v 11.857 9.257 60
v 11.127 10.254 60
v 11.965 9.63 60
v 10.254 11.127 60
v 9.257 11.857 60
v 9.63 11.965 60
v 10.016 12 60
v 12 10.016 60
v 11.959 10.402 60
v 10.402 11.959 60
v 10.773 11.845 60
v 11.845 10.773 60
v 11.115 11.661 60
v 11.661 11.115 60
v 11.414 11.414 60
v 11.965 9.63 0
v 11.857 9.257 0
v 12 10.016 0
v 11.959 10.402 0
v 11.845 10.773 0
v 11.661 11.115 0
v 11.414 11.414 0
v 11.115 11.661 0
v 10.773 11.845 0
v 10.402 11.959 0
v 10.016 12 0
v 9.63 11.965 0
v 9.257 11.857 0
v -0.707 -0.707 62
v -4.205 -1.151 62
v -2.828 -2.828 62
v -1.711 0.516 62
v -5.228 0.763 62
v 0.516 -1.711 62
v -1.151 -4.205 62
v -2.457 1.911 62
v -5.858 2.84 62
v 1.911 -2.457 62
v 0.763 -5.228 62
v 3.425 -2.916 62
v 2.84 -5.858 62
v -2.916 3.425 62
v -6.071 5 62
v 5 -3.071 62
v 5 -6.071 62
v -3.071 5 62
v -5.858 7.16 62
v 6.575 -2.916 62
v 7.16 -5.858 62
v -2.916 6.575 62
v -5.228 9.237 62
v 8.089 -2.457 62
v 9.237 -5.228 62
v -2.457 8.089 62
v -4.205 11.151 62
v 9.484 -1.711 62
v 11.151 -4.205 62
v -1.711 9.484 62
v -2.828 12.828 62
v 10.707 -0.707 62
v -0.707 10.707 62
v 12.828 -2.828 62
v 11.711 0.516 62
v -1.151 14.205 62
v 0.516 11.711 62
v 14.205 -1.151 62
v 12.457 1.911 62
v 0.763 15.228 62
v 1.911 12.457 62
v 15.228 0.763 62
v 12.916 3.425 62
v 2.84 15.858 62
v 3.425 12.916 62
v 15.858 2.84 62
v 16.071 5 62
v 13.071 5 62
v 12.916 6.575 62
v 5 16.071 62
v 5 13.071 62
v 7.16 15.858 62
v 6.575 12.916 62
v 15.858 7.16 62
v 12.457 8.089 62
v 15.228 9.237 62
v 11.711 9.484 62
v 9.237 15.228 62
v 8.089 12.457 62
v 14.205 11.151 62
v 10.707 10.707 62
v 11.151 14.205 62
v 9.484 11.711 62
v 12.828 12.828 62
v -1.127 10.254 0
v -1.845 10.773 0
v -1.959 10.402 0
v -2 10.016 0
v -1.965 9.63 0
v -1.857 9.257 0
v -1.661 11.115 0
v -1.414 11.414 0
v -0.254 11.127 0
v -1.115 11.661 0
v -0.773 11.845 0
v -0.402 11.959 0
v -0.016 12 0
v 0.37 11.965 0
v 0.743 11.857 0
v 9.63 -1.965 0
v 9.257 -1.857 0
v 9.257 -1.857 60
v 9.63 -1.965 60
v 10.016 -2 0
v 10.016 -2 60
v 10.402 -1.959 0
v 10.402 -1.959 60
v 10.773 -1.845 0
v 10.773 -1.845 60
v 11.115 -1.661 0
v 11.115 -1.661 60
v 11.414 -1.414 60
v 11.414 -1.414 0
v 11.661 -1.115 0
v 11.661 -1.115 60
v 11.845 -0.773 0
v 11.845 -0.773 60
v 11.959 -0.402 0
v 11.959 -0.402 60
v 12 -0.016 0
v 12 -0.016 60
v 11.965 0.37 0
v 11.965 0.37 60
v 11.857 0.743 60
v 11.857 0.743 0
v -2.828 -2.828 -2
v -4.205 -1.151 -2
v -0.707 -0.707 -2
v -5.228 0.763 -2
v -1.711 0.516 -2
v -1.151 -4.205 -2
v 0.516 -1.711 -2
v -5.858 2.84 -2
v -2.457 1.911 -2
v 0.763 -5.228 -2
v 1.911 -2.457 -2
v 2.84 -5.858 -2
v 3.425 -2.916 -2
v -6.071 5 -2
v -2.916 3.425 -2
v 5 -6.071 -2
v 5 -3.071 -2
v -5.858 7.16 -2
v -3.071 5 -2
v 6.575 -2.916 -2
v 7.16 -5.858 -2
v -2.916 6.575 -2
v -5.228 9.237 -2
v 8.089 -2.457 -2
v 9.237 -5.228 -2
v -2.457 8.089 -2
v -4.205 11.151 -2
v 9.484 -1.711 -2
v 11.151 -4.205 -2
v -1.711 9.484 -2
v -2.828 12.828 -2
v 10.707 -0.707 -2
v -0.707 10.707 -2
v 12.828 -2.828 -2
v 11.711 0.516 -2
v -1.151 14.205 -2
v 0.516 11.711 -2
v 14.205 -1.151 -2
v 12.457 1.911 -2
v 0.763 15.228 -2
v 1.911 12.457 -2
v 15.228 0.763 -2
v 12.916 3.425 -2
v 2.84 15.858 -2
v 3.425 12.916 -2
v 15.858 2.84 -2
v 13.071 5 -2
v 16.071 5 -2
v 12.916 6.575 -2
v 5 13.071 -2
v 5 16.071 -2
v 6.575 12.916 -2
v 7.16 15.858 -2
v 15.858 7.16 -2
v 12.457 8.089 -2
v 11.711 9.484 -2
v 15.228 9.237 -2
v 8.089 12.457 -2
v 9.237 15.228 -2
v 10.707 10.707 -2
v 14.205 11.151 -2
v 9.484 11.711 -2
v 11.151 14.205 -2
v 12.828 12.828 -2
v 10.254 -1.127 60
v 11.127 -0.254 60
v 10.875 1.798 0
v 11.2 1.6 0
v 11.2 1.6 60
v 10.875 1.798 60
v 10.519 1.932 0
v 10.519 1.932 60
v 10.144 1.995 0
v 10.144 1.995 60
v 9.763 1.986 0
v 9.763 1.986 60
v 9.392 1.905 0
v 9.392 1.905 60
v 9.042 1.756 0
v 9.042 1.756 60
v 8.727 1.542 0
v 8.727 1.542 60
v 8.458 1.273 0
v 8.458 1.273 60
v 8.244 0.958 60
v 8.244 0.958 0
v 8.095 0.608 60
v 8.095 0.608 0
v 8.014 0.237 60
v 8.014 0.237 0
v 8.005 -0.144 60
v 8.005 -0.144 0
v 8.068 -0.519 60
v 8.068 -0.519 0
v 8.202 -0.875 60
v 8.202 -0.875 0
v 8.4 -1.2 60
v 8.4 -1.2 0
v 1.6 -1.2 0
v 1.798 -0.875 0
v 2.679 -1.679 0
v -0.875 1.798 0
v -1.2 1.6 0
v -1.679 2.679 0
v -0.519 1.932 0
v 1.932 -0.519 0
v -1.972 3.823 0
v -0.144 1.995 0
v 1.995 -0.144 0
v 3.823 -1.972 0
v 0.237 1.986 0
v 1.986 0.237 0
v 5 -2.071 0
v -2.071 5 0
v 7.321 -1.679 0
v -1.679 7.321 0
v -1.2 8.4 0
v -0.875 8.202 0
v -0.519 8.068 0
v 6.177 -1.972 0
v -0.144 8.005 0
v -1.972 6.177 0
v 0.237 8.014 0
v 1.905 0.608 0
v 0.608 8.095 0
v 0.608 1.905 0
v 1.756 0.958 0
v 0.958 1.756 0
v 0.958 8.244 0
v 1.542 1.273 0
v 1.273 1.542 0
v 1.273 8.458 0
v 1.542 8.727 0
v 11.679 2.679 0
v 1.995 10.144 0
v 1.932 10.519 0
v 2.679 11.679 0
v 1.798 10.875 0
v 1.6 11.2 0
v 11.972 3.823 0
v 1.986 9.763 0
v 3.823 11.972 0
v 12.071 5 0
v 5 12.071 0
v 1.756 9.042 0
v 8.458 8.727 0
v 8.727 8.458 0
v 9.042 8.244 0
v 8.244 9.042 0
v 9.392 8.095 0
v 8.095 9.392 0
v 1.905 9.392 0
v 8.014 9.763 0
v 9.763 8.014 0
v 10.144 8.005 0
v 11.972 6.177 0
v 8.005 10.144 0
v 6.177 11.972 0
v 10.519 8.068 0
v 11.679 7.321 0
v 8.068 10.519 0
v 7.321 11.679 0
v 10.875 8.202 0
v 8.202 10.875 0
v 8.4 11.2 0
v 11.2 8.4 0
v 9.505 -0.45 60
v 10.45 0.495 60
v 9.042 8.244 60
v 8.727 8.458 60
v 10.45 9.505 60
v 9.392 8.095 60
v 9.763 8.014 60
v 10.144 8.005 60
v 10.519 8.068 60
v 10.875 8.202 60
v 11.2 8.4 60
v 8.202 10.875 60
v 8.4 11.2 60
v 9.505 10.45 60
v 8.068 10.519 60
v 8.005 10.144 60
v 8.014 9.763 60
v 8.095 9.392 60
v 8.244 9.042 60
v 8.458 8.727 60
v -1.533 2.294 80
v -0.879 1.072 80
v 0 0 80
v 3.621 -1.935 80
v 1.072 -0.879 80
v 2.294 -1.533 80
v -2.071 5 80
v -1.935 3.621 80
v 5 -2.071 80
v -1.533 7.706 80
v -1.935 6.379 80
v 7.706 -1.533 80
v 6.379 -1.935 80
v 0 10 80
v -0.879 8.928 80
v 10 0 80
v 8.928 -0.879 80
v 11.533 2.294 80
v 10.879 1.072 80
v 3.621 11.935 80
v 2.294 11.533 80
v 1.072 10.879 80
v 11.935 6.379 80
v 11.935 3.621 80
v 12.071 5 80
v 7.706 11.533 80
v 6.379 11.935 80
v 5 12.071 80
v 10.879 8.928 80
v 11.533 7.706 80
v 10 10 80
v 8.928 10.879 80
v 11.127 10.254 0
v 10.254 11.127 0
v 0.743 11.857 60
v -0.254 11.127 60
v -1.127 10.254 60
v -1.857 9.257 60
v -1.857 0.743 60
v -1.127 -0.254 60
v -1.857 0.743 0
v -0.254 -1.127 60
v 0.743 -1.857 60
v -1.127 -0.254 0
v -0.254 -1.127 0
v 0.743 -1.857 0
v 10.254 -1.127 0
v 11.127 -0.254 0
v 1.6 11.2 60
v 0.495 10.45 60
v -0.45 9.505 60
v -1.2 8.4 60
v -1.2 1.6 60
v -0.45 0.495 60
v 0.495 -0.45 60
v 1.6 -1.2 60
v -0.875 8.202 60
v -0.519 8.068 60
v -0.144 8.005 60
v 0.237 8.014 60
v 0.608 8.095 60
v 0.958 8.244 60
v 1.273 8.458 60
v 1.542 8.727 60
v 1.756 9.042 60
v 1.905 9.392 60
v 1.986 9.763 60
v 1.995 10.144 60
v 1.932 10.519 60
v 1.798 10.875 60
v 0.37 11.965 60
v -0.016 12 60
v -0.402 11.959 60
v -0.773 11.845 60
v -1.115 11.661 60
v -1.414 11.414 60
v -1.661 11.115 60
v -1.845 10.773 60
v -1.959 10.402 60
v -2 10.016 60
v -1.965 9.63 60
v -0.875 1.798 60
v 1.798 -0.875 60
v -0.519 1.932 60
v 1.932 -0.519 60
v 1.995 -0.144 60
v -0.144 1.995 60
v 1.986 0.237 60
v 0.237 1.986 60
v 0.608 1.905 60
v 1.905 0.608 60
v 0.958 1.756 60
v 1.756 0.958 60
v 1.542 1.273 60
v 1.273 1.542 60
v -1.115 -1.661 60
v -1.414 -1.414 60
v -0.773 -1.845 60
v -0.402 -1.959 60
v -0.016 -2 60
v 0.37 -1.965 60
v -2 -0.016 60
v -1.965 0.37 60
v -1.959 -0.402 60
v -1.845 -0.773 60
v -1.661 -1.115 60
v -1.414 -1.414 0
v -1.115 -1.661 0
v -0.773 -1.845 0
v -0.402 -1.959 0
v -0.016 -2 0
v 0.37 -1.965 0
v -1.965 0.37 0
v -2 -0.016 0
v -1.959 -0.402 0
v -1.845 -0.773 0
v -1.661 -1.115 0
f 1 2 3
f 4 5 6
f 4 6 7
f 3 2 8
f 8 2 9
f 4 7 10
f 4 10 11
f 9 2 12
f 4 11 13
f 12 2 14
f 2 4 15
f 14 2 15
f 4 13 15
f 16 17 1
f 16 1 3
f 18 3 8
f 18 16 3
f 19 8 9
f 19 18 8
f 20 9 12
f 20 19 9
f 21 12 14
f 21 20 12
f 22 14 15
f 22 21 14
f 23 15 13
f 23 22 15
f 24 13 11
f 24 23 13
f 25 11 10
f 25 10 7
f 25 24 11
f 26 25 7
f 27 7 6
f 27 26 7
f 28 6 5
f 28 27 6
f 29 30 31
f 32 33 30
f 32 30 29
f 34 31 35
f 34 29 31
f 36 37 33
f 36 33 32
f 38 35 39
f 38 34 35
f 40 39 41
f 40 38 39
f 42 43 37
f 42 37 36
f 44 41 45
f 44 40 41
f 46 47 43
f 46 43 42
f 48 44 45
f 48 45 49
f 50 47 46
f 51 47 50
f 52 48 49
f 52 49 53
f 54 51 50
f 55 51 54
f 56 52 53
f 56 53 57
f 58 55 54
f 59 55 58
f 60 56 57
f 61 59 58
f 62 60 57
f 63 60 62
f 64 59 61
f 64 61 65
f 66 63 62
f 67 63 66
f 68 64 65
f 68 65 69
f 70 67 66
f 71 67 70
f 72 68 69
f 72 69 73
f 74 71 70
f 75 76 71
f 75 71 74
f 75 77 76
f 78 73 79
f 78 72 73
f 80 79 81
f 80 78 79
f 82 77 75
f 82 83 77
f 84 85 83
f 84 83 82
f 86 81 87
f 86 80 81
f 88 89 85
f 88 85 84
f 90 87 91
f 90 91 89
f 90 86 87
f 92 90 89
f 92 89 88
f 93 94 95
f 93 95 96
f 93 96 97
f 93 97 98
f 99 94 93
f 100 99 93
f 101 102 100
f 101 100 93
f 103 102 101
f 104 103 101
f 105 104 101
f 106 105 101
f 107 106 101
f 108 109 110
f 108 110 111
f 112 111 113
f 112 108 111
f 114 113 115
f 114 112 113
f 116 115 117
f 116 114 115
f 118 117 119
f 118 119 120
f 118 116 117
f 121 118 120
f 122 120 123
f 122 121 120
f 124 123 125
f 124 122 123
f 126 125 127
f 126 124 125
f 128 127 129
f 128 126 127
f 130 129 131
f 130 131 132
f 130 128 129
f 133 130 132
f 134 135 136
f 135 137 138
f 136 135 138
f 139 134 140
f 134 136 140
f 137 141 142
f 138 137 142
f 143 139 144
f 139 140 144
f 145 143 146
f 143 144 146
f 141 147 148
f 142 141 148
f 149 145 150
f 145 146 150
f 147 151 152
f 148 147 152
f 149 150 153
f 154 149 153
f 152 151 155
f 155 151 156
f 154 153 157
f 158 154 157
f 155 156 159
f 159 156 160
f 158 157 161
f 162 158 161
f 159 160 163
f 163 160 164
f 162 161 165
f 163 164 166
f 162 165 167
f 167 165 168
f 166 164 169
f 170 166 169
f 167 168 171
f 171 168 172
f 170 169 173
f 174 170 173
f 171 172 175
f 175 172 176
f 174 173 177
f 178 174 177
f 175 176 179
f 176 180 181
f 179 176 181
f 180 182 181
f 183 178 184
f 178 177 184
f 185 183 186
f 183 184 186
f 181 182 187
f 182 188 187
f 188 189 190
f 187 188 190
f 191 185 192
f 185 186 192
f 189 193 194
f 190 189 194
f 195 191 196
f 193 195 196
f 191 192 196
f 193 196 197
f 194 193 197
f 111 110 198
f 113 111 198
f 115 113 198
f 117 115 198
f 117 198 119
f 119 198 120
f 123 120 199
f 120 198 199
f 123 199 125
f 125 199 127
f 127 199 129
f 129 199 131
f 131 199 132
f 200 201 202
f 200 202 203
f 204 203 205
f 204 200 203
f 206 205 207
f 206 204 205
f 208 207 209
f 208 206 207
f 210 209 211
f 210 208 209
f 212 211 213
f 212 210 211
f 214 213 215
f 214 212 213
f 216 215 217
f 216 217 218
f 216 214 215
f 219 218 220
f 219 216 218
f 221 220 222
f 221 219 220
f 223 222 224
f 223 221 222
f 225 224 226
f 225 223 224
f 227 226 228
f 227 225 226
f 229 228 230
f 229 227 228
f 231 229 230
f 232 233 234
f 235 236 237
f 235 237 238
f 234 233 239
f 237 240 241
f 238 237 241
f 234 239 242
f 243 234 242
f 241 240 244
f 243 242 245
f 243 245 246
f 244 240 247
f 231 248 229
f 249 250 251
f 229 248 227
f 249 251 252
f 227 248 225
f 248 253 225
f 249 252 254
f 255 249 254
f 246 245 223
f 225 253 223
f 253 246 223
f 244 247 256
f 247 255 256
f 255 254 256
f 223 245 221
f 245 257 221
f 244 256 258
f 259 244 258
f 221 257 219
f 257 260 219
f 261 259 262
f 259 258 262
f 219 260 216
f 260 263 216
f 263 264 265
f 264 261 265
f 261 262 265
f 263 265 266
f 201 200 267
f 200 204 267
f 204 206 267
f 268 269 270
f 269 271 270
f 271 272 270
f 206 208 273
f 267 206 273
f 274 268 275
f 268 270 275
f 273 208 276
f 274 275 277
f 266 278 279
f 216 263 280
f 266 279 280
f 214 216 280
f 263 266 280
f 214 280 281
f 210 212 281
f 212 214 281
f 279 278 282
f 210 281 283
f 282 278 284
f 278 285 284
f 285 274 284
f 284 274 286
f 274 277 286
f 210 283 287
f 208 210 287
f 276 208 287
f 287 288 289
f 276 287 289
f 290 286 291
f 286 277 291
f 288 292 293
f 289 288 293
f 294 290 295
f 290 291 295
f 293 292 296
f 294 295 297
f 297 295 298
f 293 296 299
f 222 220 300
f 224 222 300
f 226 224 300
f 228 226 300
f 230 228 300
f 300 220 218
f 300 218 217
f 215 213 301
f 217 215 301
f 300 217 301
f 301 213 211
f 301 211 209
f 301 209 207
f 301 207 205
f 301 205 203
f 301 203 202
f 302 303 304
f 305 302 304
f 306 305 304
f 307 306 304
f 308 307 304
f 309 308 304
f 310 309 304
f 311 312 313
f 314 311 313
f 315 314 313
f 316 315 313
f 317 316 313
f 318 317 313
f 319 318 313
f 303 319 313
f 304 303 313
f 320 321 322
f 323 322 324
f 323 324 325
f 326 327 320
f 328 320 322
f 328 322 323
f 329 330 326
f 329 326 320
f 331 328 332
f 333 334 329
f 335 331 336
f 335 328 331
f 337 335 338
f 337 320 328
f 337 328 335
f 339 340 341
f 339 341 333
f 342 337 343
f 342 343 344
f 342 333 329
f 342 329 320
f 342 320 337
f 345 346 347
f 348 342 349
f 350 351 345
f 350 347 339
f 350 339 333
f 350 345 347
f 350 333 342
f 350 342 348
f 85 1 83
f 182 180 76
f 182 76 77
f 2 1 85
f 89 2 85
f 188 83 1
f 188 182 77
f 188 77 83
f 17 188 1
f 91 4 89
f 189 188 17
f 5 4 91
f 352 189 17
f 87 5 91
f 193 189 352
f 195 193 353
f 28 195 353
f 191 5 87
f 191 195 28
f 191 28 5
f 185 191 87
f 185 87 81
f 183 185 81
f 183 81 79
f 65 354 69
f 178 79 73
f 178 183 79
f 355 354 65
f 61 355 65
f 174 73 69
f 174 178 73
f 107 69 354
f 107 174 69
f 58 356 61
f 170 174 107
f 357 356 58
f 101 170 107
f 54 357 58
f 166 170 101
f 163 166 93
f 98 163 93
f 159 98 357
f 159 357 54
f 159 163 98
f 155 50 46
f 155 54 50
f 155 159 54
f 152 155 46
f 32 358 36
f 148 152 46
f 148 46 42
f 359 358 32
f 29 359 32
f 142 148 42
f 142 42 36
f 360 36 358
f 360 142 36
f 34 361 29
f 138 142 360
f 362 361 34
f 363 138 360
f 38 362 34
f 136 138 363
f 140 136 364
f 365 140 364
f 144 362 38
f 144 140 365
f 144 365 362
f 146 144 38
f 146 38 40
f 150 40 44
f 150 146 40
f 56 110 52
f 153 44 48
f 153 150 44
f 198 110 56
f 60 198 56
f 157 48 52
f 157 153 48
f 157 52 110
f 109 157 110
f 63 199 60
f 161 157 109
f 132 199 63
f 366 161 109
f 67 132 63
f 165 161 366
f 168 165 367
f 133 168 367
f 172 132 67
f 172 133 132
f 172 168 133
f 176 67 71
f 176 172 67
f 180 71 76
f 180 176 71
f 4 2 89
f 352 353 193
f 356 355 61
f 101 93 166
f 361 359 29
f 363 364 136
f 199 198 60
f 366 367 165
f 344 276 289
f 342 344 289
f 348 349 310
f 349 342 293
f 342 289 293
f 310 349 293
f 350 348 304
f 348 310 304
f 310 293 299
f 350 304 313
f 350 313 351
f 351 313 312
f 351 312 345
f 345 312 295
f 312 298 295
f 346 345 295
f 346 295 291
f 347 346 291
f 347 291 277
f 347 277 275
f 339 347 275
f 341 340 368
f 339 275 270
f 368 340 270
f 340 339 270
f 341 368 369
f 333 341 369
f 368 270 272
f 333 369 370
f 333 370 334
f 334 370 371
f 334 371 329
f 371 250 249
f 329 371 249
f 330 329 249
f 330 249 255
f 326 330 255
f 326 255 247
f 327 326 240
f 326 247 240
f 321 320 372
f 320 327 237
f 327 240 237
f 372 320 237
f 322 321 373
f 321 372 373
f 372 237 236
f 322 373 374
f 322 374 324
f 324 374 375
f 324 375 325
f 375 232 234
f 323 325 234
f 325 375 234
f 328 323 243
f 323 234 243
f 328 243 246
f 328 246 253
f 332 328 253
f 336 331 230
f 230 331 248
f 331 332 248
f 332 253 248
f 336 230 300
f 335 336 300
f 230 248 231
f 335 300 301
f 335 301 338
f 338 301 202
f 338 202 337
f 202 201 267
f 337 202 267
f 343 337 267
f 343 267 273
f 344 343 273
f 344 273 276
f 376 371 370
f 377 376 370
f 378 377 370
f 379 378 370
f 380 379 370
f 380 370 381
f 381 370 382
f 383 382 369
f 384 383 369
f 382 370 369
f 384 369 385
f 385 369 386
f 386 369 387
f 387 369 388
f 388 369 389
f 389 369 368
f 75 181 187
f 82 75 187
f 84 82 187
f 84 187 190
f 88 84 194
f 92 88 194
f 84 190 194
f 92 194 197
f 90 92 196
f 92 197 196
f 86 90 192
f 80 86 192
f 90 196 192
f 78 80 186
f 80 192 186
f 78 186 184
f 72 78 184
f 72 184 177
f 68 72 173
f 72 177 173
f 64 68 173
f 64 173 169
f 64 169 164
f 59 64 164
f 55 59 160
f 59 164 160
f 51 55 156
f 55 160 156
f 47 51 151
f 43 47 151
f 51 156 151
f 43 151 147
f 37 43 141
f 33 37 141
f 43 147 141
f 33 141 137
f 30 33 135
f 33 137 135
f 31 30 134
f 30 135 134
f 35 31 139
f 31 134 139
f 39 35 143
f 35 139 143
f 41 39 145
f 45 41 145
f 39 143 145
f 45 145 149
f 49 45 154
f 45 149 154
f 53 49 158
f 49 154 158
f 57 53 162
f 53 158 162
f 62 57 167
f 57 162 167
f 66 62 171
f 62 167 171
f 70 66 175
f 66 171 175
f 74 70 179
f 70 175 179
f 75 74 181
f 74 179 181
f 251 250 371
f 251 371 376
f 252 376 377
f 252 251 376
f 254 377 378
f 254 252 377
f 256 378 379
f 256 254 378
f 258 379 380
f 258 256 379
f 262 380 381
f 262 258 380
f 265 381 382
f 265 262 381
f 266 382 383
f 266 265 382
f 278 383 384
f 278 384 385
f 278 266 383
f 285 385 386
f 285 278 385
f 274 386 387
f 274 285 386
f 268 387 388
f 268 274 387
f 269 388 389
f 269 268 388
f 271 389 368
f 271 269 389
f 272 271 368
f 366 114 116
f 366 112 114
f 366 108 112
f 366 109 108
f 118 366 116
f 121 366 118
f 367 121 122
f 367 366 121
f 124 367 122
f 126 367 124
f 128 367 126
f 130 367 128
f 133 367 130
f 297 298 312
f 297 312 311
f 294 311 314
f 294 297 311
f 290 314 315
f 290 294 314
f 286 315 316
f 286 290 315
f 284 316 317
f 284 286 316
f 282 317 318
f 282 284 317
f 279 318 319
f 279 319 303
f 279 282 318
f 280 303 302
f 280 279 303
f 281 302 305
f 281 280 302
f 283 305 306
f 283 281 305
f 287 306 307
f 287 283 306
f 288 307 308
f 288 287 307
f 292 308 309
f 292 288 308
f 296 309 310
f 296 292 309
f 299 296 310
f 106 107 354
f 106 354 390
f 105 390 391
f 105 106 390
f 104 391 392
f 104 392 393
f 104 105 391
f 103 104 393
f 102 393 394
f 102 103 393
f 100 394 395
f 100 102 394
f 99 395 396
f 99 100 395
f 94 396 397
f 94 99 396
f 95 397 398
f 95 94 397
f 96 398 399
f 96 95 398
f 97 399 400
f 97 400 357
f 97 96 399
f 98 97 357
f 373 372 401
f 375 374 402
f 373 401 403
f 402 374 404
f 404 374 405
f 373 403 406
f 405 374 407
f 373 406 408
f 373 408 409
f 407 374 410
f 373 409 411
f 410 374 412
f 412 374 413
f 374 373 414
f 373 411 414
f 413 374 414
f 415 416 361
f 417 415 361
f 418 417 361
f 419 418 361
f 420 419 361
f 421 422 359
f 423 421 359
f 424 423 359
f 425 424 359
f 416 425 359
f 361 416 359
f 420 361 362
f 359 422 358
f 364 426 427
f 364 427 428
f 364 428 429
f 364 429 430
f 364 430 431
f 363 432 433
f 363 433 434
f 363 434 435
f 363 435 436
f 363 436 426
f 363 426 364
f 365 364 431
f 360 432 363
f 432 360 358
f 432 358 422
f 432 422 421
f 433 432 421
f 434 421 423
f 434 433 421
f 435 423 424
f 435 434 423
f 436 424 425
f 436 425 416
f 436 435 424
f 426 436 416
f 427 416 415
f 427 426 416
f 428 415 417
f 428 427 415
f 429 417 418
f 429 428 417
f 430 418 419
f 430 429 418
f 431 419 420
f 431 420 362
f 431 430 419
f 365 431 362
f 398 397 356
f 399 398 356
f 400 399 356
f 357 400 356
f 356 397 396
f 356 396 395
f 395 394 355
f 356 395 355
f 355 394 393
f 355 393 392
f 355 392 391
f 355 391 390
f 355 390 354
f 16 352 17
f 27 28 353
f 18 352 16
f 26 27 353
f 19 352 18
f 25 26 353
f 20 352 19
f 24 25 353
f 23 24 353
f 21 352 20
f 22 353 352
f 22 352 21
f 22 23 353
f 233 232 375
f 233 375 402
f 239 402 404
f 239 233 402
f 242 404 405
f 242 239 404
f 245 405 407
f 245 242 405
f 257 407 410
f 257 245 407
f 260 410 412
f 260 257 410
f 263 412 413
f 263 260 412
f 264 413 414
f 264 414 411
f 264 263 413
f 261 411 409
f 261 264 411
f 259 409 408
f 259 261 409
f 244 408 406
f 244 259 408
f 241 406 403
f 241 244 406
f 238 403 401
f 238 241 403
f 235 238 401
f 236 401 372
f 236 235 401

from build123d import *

# Parameters (mm, degrees)
CYLINDER_R        = 2
CYLINDER_DEPTH    = 60
CYLINDER001_R     = 2
CYLINDER001_DEPTH = 60
CYLINDER002_R     = 2
CYLINDER002_DEPTH = 60
CYLINDER003_R     = 2
CYLINDER003_DEPTH = 60
CYLINDER004_R     = 7.071
CYLINDER004_DEPTH = 80
CYLINDER005_R     = 2
CYLINDER005_DEPTH = 60
CYLINDER006_R     = 2
CYLINDER006_DEPTH = 60
CYLINDER007_R     = 2
CYLINDER007_DEPTH = 60
CYLINDER008_R     = 2
CYLINDER008_DEPTH = 60
CYLINDER010_R     = 8.071
CYLINDER010_DEPTH = 80
CYLINDER009_R     = 11.071
CYLINDER009_DEPTH = 64


with BuildPart() as cylinder:
    # Cylinder → Cylinder (new body)
    with BuildSketch(Plane.XY):
        Circle(CYLINDER_R)
    extrude(amount=CYLINDER_DEPTH)


with BuildPart() as cylinder001:
    # Cylinder001 → Cylinder001 (new body)
    with BuildSketch(Plane(origin=(0, 10, 0), x_dir=(1, 0, 0), z_dir=(0, 0, 1))):
        Circle(CYLINDER001_R)
    extrude(amount=CYLINDER001_DEPTH)


with BuildPart() as cylinder002:
    # Cylinder002 → Cylinder002 (new body)
    with BuildSketch(Plane(origin=(10, 0, 0), x_dir=(1, 0, 0), z_dir=(0, 0, 1))):
        Circle(CYLINDER002_R)
    extrude(amount=CYLINDER002_DEPTH)


with BuildPart() as cylinder003:
    # Cylinder003 → Cylinder003 (new body)
    with BuildSketch(Plane(origin=(10, 10, 0), x_dir=(1, 0, 0), z_dir=(0, 0, 1))):
        Circle(CYLINDER003_R)
    extrude(amount=CYLINDER003_DEPTH)


with BuildPart() as cut003:
    # Cylinder004 → Cylinder004 (new body)
    with BuildSketch(Plane(origin=(5, 5, 0), x_dir=(1, 0, 0), z_dir=(0, 0, 1))):
        Circle(CYLINDER004_R)
    extrude(amount=CYLINDER004_DEPTH)

    # Cut: cut Cylinder003
    add(cylinder003.part, mode=Mode.SUBTRACT)

    # Cut001: cut Cylinder002
    add(cylinder002.part, mode=Mode.SUBTRACT)

    # Cut002: cut Cylinder001
    add(cylinder001.part, mode=Mode.SUBTRACT)

    # Cut003: cut Cylinder
    add(cylinder.part, mode=Mode.SUBTRACT)


with BuildPart() as cylinder005:
    # Cylinder005 → Cylinder005 (new body)
    with BuildSketch(Plane.XY):
        Circle(CYLINDER005_R)
    extrude(amount=CYLINDER005_DEPTH)


with BuildPart() as cylinder006:
    # Cylinder006 → Cylinder006 (new body)
    with BuildSketch(Plane(origin=(0, 10, 0), x_dir=(1, 0, 0), z_dir=(0, 0, 1))):
        Circle(CYLINDER006_R)
    extrude(amount=CYLINDER006_DEPTH)


with BuildPart() as cylinder007:
    # Cylinder007 → Cylinder007 (new body)
    with BuildSketch(Plane(origin=(10, 0, 0), x_dir=(1, 0, 0), z_dir=(0, 0, 1))):
        Circle(CYLINDER007_R)
    extrude(amount=CYLINDER007_DEPTH)


with BuildPart() as cylinder008:
    # Cylinder008 → Cylinder008 (new body)
    with BuildSketch(Plane(origin=(10, 10, 0), x_dir=(1, 0, 0), z_dir=(0, 0, 1))):
        Circle(CYLINDER008_R)
    extrude(amount=CYLINDER008_DEPTH)


with BuildPart() as cylinder010:
    # Cylinder010 → Cylinder010 (new body)
    with BuildSketch(Plane(origin=(5, 5, -3), x_dir=(1, 0, 0), z_dir=(0, 0, 1))):
        Circle(CYLINDER010_R)
    extrude(amount=CYLINDER010_DEPTH)


with BuildPart() as cut008:
    # Cylinder009 → Cylinder009 (new body)
    with BuildSketch(Plane(origin=(5, 5, -2), x_dir=(1, 0, 0), z_dir=(0, 0, 1))):
        Circle(CYLINDER009_R)
    extrude(amount=CYLINDER009_DEPTH)

    # Cut004: cut Cylinder010
    add(cylinder010.part, mode=Mode.SUBTRACT)

    # Cut005: cut Cylinder008
    add(cylinder008.part, mode=Mode.SUBTRACT)

    # Cut006: cut Cylinder007
    add(cylinder007.part, mode=Mode.SUBTRACT)

    # Cut007: cut Cylinder006
    add(cylinder006.part, mode=Mode.SUBTRACT)

    # Cut008: cut Cylinder005
    add(cylinder005.part, mode=Mode.SUBTRACT)


solid = Compound([cut003.part, cut008.part])
